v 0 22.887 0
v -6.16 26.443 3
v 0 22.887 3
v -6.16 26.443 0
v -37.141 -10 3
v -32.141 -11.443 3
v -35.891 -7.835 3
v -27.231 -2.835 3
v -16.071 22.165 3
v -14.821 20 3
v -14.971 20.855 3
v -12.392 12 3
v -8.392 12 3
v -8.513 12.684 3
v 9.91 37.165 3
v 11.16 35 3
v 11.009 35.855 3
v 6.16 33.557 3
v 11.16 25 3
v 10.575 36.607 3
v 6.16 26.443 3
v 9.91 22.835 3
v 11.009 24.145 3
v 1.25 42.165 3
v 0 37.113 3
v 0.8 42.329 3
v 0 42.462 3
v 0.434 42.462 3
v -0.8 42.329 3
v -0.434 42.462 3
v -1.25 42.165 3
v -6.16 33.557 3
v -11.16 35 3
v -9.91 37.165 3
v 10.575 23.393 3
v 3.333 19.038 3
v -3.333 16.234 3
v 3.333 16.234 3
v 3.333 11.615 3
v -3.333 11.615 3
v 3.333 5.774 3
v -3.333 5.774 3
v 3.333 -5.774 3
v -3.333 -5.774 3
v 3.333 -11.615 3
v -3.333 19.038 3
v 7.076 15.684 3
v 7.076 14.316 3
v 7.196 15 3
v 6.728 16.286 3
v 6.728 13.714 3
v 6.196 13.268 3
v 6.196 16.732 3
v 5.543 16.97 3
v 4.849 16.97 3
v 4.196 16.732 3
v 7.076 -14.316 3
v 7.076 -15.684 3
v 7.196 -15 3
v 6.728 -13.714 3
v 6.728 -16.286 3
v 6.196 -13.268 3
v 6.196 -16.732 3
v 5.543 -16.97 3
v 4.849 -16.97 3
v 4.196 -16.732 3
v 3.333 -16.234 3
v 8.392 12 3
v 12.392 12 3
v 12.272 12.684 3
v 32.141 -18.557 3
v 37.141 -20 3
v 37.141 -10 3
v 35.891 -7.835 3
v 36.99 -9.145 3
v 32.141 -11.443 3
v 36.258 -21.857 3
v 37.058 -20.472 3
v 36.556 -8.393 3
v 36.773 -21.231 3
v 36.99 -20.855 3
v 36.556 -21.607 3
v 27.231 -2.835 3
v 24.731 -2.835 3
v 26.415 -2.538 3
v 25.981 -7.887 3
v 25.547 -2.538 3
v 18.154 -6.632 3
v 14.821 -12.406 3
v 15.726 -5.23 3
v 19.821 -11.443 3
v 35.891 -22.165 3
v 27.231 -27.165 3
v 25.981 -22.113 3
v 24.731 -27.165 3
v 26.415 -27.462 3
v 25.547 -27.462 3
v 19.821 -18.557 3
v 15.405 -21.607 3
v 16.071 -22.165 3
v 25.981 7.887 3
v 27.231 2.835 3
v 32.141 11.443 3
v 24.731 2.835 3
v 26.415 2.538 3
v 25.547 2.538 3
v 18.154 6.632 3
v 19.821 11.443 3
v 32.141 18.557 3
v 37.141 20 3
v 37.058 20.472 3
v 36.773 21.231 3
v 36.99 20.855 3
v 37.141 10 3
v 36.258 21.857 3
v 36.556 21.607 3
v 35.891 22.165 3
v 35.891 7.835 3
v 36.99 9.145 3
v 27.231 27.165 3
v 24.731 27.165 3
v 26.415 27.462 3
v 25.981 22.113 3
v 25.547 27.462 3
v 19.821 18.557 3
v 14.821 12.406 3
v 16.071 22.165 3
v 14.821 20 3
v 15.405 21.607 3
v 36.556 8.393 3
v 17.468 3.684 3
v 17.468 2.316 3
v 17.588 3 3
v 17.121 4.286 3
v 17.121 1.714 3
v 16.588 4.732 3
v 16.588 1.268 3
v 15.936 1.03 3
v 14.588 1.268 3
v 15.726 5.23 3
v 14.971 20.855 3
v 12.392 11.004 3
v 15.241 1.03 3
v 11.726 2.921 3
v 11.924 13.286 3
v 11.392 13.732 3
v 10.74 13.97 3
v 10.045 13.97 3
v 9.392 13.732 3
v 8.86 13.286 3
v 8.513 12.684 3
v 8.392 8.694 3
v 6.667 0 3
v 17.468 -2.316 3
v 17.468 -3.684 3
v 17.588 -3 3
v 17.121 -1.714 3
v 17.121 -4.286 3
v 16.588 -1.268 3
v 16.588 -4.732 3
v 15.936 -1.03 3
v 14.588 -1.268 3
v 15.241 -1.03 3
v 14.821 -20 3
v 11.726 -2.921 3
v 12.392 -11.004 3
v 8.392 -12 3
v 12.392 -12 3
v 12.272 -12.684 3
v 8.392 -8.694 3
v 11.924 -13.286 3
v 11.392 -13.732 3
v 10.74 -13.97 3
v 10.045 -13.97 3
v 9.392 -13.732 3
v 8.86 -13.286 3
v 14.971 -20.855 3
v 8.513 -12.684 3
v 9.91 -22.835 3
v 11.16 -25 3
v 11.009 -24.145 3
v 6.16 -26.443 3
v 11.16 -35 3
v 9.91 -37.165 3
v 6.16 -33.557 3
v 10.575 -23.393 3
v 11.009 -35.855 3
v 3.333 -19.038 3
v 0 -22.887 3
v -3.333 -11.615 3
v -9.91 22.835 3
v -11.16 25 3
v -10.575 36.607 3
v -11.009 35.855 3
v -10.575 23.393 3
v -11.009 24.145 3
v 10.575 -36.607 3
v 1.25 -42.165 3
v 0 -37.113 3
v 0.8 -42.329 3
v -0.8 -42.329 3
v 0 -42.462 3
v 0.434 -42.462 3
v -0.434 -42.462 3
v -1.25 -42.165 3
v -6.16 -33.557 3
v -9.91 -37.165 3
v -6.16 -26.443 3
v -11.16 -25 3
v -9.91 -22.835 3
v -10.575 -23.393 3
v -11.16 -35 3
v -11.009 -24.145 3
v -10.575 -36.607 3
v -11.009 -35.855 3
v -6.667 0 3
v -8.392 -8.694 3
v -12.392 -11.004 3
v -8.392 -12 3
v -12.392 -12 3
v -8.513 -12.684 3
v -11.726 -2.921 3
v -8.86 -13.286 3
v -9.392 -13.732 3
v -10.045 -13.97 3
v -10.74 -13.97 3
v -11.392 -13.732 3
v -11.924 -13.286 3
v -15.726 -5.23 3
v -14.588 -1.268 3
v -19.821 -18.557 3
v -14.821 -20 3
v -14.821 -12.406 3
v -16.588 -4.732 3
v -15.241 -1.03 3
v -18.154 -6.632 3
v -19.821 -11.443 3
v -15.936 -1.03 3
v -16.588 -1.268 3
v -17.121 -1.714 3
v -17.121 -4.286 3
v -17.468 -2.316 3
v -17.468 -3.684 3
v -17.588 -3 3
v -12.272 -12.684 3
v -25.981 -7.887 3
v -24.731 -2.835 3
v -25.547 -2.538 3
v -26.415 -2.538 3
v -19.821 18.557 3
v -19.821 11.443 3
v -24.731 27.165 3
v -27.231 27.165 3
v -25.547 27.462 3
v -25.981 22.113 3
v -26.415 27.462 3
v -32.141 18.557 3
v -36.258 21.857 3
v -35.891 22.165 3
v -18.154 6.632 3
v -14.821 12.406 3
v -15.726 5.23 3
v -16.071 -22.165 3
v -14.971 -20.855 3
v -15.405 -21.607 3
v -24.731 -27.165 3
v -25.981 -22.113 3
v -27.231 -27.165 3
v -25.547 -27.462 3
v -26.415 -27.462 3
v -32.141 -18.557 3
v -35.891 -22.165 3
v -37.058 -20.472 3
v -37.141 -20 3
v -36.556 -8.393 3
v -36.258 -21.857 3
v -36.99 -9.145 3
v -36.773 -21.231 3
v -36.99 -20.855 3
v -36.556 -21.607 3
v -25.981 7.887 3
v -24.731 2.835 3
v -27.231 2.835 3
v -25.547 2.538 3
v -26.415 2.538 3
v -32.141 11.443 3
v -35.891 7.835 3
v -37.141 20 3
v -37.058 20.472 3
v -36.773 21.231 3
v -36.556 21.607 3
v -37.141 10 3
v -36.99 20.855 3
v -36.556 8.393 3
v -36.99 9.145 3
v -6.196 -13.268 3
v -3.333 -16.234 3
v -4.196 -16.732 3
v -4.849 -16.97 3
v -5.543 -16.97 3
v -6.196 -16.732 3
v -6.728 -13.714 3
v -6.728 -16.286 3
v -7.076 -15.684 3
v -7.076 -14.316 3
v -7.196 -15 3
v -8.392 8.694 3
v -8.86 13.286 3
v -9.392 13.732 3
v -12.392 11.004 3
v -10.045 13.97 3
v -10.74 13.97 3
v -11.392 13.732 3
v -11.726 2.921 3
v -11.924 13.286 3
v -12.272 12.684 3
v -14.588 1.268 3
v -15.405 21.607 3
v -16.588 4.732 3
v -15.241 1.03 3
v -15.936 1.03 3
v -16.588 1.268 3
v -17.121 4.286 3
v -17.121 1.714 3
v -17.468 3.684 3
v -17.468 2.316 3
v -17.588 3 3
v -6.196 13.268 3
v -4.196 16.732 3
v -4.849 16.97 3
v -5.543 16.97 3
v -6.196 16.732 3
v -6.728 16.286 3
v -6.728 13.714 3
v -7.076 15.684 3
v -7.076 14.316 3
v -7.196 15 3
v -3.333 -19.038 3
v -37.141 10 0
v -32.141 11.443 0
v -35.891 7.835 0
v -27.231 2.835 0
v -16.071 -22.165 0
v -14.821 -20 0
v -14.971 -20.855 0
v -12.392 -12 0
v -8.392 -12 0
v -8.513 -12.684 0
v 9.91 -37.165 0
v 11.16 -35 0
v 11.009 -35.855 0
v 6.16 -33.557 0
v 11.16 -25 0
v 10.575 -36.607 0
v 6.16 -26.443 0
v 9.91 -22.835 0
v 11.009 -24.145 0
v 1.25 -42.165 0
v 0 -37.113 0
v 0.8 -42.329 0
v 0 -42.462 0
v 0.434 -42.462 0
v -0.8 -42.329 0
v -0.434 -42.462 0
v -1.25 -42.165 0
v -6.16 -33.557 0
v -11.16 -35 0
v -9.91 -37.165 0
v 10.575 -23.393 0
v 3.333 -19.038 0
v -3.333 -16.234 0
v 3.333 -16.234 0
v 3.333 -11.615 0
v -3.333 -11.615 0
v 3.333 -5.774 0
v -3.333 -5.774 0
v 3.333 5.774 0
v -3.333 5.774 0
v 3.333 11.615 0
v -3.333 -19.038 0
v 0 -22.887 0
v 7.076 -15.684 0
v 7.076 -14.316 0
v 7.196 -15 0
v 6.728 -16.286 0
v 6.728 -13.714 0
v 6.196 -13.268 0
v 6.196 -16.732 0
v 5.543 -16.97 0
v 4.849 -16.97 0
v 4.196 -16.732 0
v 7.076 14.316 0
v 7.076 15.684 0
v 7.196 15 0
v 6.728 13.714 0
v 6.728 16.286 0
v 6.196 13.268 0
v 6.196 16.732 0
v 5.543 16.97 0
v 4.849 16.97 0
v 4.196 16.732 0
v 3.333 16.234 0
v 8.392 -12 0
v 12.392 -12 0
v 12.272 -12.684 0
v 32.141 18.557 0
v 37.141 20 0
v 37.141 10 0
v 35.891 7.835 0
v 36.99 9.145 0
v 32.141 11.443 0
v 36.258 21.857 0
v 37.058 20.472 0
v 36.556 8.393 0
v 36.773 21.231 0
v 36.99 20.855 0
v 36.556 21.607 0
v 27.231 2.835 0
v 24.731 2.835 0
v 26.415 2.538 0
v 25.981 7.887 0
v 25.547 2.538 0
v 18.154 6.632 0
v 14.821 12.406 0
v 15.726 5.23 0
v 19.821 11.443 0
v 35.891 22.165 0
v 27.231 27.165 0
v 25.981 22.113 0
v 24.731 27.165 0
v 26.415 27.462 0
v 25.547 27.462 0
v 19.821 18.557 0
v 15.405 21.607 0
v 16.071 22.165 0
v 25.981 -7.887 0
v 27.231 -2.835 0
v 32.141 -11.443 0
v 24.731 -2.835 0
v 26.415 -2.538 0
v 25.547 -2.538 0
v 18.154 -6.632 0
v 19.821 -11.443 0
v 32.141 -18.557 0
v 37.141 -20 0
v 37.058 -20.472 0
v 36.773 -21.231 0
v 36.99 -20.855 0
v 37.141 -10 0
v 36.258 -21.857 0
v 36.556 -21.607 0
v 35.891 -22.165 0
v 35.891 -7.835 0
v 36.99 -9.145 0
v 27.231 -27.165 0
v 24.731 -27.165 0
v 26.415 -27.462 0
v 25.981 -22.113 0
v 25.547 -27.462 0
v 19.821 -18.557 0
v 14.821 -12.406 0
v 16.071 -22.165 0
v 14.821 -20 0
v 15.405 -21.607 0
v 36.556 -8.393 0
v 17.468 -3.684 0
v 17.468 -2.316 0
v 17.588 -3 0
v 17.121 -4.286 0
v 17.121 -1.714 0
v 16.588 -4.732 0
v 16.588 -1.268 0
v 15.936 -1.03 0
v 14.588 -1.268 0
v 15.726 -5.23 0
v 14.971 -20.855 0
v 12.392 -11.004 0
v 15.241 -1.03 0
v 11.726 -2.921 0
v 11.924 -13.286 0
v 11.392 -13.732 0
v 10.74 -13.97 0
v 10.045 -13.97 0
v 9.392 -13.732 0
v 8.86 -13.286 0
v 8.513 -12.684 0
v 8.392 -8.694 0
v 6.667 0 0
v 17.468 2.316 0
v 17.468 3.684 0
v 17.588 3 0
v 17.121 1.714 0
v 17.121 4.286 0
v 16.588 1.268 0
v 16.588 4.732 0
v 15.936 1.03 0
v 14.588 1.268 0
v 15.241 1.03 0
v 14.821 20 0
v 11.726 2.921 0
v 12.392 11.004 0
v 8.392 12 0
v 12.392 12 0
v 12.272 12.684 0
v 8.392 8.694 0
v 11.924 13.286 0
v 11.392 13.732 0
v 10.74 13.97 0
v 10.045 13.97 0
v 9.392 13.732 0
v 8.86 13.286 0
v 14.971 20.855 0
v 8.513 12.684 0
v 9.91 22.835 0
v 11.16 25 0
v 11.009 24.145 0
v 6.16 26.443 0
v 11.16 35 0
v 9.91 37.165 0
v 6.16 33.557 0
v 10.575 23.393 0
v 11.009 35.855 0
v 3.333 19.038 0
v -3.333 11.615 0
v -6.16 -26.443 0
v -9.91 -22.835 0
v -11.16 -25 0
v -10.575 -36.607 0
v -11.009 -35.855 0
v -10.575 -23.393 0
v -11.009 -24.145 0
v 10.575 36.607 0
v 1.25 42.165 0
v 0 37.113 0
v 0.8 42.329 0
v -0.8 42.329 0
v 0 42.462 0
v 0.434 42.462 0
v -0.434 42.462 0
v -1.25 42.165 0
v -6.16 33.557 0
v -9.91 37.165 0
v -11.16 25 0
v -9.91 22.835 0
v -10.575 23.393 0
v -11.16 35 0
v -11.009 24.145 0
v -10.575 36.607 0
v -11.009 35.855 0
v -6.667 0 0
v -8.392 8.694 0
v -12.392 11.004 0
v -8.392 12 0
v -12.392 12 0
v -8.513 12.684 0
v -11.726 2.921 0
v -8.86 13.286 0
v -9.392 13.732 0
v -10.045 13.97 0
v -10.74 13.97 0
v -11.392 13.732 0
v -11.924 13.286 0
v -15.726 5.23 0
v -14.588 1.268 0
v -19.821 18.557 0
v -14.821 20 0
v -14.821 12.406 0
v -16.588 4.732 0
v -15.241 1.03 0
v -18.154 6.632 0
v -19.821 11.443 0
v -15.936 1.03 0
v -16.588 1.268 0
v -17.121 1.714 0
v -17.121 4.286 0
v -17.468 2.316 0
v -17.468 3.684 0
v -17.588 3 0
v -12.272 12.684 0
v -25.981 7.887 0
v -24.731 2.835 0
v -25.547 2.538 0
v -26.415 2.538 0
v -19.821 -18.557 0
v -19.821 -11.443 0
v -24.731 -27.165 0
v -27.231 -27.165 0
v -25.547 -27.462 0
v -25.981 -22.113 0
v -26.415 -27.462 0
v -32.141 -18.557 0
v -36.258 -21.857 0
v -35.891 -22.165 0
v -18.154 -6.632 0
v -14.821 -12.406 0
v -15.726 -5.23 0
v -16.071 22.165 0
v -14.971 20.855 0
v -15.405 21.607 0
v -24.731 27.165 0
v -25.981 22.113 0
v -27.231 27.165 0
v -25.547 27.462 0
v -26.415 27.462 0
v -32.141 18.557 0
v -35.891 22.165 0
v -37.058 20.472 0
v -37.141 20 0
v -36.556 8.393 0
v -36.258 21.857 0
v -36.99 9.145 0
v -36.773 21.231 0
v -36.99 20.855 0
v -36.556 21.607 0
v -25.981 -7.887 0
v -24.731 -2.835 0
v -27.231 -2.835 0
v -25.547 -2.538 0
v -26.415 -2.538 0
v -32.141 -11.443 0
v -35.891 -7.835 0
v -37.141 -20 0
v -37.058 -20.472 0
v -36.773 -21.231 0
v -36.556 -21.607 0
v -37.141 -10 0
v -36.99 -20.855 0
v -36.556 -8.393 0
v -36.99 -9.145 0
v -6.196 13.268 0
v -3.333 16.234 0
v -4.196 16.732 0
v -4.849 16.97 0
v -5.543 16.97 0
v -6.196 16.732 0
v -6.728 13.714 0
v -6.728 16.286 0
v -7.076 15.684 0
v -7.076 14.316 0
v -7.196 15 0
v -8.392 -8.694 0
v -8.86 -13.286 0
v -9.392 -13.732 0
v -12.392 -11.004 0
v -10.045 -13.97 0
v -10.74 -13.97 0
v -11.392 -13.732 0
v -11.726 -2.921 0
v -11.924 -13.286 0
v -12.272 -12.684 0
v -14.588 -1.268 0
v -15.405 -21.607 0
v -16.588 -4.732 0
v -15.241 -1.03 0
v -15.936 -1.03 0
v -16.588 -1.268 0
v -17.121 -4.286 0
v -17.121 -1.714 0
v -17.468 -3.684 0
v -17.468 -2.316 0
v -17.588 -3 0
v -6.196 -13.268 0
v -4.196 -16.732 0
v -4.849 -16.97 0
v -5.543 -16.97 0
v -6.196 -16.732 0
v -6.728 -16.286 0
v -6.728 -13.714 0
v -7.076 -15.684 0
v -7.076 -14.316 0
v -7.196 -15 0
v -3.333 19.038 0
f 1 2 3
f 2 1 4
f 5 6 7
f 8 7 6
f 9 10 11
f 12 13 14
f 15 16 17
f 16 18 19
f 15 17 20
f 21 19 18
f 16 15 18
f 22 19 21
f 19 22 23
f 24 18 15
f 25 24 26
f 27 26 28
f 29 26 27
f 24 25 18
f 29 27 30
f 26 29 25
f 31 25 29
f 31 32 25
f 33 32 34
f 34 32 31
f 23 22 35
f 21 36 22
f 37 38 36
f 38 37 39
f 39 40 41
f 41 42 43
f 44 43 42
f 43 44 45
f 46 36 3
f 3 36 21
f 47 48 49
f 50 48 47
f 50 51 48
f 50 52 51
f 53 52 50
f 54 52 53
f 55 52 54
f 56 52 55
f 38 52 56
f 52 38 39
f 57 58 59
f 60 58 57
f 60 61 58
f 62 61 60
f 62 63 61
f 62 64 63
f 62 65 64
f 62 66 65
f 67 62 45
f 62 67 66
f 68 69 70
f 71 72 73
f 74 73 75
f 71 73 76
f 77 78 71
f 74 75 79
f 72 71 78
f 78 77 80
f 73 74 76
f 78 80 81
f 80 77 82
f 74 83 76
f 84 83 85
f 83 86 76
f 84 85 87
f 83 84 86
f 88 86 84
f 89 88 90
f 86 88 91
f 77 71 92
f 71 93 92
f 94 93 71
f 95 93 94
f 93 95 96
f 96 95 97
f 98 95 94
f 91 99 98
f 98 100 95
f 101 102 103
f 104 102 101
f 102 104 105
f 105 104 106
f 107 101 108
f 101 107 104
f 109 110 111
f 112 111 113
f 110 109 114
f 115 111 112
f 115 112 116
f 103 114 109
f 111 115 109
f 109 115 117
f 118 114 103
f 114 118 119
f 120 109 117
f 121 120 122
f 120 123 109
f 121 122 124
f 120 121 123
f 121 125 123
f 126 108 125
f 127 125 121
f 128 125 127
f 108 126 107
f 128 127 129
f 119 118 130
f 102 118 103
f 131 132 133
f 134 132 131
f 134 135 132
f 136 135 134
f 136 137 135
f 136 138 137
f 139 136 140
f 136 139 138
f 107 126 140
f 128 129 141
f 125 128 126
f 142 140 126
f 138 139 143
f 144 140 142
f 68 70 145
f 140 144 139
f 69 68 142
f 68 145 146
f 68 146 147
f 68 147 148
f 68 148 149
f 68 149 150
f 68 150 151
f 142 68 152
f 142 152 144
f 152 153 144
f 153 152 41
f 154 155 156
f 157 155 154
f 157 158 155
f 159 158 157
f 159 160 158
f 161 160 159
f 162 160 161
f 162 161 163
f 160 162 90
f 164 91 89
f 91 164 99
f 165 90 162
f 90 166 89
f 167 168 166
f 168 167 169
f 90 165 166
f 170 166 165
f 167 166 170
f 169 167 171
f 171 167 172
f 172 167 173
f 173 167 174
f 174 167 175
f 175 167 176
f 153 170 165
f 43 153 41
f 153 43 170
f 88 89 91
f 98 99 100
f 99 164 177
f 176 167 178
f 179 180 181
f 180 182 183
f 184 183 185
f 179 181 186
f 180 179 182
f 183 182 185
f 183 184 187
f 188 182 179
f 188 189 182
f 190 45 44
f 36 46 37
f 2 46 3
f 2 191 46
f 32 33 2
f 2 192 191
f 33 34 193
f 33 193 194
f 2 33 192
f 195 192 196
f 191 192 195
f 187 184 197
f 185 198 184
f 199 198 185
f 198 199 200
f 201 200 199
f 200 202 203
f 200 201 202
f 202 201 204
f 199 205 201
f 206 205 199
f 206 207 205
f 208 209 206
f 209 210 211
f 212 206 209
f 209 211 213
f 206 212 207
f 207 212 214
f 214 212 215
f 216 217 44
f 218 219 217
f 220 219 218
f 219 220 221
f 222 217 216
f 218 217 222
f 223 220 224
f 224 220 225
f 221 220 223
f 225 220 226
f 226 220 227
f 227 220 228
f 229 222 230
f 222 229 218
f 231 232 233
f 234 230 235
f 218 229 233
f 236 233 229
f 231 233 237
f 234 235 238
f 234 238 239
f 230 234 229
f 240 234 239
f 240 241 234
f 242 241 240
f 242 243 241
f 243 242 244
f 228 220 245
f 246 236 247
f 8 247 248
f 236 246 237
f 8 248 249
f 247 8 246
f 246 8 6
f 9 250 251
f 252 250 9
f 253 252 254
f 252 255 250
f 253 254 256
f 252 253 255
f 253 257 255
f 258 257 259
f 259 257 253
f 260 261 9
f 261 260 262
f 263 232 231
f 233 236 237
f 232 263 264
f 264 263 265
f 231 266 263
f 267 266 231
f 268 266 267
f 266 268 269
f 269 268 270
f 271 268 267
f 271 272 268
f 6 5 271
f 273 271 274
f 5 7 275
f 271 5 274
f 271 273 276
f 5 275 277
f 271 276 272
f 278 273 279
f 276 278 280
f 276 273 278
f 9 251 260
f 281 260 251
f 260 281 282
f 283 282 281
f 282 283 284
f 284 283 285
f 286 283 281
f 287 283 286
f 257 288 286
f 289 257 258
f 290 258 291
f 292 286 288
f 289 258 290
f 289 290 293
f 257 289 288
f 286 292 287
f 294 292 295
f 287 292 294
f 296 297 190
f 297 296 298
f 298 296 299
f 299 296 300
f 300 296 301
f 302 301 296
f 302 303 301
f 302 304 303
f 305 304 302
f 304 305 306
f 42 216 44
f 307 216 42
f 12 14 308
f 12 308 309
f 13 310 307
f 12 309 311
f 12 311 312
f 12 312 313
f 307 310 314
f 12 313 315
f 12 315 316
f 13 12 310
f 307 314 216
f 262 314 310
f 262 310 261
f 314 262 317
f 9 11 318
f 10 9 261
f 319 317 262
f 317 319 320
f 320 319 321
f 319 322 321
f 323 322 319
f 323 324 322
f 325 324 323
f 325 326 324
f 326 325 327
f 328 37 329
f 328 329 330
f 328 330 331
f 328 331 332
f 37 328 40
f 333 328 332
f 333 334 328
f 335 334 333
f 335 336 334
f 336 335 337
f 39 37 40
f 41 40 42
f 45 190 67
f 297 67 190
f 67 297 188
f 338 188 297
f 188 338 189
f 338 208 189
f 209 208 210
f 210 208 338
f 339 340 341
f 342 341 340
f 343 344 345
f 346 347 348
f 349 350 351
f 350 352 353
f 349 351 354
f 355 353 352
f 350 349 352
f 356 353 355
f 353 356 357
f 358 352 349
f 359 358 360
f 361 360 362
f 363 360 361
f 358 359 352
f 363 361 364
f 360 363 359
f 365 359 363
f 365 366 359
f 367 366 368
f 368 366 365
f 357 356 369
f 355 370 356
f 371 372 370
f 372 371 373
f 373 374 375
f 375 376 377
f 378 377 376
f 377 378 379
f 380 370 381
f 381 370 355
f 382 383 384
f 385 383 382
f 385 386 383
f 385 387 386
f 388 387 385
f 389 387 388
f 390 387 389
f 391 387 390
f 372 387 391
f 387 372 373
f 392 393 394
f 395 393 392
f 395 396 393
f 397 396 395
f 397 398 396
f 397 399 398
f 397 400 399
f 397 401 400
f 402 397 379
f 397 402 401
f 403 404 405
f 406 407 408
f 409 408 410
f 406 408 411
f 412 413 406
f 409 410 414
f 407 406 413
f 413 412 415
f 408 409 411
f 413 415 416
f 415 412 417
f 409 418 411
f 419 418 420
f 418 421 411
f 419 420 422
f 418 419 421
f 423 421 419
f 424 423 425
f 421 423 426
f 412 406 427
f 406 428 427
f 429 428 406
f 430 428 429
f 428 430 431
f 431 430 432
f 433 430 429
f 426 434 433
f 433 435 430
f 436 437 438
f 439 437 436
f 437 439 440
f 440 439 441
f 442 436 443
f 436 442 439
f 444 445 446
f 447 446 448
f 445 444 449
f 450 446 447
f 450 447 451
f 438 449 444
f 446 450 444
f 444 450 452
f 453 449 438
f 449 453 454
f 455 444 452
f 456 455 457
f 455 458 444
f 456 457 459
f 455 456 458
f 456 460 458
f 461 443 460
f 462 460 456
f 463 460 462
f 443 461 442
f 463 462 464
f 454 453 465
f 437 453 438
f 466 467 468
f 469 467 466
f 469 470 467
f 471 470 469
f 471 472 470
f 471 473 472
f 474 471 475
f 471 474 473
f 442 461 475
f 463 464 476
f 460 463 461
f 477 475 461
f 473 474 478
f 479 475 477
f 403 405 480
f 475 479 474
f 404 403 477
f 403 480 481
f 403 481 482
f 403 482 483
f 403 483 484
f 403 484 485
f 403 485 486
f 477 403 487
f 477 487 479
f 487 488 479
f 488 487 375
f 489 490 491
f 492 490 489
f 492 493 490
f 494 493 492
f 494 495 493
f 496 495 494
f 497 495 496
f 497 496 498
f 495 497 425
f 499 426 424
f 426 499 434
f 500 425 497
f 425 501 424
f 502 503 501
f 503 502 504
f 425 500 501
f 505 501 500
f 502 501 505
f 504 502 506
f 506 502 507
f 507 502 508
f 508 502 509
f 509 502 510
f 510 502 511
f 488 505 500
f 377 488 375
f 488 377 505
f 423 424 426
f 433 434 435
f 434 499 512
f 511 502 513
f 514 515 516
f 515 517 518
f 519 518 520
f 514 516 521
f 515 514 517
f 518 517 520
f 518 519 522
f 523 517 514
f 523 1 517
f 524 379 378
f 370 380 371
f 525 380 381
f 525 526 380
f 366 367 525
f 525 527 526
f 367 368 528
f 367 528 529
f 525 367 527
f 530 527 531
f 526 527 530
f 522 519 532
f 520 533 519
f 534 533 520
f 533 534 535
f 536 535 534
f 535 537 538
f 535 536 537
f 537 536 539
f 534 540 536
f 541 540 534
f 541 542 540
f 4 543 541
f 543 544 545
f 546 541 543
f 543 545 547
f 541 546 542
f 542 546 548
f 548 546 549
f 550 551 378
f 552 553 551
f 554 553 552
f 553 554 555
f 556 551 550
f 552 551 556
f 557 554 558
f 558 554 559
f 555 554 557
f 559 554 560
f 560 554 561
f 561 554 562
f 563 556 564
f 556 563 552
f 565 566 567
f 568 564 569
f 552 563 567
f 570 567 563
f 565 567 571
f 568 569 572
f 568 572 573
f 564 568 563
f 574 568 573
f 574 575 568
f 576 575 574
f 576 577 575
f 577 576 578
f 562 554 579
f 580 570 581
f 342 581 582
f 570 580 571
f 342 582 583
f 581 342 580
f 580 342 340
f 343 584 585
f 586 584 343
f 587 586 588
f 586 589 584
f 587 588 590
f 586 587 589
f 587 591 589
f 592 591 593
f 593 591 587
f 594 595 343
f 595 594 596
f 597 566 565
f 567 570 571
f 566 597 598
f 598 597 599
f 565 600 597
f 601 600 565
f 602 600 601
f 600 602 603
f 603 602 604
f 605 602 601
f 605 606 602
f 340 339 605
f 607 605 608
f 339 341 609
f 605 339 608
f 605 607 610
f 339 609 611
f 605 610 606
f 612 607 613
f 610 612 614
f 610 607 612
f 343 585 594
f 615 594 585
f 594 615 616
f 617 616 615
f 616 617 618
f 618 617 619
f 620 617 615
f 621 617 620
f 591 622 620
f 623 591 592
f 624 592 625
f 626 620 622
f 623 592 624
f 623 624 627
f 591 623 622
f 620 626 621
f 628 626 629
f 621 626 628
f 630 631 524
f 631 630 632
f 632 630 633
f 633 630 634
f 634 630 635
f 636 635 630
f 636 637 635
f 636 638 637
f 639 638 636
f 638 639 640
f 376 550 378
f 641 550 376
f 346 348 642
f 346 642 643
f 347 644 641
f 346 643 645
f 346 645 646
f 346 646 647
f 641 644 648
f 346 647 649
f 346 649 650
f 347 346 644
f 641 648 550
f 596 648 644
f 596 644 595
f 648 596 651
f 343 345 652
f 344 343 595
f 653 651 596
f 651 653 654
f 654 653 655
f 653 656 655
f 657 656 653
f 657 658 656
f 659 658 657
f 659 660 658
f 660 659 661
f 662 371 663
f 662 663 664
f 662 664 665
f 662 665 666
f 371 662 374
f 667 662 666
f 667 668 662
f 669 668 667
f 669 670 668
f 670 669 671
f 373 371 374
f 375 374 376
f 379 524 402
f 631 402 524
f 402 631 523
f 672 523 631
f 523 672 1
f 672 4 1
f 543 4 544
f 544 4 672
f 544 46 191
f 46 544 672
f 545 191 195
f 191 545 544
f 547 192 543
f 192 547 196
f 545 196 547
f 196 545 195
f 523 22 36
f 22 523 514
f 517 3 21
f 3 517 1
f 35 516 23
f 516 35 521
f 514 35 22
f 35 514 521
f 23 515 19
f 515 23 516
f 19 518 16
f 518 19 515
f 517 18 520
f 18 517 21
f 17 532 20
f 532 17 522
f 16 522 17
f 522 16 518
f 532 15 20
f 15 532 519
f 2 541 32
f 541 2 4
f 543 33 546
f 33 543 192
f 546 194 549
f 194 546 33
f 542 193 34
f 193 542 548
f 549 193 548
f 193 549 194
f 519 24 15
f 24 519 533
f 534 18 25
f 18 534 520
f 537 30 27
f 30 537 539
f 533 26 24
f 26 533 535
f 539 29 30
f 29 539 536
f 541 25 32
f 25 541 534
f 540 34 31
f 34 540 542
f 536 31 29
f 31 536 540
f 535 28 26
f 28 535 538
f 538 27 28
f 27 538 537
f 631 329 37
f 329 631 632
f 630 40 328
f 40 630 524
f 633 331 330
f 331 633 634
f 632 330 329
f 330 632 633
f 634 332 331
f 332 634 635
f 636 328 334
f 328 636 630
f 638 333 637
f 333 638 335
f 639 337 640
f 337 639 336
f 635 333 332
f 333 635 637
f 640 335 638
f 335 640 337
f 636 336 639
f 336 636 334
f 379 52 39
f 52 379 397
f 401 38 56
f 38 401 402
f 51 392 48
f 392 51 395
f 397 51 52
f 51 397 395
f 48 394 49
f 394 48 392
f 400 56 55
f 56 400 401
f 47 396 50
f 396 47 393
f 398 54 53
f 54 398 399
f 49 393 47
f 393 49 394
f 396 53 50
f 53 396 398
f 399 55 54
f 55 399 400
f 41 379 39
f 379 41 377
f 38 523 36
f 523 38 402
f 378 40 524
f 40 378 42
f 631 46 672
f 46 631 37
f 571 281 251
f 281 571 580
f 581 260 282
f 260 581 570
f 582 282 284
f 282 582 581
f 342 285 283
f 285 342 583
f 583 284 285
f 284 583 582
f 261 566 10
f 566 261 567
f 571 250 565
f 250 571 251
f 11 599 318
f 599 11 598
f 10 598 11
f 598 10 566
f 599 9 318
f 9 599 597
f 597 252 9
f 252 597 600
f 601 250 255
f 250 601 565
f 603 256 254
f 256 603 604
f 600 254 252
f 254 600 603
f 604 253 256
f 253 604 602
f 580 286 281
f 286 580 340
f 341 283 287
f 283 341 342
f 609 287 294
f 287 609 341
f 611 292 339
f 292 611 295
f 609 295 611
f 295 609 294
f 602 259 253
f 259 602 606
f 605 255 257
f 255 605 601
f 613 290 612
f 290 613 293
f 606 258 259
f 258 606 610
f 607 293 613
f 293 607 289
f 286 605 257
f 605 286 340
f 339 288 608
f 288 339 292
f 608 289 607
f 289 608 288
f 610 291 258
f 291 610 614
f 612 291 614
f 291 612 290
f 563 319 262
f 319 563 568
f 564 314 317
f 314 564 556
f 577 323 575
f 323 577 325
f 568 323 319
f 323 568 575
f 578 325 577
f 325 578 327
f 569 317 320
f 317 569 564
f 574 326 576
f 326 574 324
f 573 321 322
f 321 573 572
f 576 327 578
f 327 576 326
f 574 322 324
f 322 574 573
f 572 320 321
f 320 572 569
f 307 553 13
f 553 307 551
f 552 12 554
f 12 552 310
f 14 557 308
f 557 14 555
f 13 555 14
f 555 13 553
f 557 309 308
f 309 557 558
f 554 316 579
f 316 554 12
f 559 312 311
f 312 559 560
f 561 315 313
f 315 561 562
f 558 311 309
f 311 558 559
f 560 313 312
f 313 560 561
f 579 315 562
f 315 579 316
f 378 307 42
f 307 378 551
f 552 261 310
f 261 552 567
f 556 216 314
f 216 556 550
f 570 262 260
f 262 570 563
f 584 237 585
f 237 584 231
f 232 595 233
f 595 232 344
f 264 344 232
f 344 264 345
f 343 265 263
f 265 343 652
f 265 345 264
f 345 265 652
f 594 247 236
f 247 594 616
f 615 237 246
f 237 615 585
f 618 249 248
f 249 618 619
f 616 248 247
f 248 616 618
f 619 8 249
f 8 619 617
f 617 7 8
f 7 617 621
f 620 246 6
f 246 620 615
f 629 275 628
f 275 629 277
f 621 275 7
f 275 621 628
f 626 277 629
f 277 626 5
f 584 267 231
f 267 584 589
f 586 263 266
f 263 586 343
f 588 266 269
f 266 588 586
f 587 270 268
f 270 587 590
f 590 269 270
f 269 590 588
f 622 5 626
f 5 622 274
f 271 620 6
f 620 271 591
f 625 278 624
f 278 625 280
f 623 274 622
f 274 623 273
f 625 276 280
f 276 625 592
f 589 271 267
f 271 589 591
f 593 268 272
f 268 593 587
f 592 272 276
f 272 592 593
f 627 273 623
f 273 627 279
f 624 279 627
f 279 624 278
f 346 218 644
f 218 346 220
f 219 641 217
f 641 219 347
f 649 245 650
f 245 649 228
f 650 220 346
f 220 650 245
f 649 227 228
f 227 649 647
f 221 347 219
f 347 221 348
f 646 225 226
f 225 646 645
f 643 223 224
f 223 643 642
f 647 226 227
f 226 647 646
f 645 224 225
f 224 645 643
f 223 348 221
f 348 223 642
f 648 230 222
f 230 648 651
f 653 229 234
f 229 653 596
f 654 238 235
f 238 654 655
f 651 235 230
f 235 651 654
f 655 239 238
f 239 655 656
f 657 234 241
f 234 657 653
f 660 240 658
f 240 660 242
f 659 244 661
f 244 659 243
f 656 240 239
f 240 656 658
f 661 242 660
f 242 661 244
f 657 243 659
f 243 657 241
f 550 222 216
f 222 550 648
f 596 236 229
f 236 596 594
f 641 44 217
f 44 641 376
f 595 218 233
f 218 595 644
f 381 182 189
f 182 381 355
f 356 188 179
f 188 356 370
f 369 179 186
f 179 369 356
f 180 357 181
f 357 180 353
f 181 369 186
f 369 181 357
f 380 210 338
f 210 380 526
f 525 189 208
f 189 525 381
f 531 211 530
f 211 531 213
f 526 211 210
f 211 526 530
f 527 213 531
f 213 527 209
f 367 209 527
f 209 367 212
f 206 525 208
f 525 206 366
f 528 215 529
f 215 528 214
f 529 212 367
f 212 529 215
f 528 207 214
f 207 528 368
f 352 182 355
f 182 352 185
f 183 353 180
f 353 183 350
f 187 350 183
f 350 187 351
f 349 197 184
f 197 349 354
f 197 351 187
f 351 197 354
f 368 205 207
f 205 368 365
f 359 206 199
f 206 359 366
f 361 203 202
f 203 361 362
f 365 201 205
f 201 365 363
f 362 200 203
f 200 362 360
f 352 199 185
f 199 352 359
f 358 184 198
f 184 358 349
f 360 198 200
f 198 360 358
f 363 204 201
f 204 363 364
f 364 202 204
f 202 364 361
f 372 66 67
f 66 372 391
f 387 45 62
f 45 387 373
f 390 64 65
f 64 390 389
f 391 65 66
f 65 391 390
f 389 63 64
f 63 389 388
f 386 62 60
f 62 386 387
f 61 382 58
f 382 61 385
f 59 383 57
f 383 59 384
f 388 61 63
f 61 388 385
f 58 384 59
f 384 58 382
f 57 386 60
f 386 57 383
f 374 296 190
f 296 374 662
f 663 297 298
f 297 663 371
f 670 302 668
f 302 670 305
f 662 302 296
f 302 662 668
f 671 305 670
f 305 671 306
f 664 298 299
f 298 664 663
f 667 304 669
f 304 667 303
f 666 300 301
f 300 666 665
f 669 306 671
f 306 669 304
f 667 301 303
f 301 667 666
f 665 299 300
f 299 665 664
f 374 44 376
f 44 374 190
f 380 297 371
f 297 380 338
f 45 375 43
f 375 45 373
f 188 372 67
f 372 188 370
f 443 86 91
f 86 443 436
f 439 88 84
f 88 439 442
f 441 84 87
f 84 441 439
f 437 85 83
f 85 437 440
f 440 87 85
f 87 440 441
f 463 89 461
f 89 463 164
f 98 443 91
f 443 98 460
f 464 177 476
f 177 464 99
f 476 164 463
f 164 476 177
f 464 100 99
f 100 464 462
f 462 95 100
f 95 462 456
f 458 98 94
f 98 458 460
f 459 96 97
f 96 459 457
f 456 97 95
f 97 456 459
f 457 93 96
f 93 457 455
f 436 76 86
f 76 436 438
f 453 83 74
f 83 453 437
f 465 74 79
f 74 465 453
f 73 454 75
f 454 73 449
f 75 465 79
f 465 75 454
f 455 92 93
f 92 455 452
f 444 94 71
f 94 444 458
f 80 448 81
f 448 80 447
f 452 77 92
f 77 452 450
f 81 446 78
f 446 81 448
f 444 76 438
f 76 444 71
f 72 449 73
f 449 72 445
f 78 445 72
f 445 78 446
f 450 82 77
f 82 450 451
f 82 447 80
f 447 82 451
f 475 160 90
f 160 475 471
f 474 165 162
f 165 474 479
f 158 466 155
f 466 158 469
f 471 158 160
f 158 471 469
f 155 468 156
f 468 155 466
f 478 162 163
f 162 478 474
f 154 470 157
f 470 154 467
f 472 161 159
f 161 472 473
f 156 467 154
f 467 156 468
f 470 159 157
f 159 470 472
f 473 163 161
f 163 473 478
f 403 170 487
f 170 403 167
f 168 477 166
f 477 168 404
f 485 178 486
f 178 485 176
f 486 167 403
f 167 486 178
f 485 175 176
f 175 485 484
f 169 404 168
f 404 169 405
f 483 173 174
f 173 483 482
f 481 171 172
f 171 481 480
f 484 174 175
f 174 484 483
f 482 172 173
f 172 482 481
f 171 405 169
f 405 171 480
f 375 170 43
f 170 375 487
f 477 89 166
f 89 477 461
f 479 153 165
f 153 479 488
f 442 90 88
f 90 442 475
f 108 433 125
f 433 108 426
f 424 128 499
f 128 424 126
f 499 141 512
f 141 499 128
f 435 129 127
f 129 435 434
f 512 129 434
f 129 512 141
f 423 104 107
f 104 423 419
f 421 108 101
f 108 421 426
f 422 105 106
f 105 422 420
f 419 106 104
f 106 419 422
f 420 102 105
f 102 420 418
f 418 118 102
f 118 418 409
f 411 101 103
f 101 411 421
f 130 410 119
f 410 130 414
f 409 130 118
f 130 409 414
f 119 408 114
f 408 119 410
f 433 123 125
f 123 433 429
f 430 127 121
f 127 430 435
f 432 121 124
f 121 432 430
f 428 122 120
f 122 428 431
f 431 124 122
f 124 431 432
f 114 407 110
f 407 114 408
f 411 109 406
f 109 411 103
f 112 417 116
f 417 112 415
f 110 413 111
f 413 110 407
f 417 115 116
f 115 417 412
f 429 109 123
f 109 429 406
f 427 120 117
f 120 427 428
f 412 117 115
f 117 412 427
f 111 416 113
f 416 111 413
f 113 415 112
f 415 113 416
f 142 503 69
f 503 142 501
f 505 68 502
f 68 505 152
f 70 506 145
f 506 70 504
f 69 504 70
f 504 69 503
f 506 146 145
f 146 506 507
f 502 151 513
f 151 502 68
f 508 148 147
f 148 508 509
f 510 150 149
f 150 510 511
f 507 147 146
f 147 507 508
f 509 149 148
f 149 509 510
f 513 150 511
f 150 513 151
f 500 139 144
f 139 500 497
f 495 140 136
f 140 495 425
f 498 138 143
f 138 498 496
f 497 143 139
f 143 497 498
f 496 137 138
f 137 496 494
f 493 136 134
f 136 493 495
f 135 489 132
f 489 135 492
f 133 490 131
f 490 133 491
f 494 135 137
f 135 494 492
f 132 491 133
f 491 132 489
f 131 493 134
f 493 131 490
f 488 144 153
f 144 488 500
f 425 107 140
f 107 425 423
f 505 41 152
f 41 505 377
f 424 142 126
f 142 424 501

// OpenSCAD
// snowflake 2
// @author Ilya Protasov

height = 3;
radius = 40;
thickA = radius/6;
thickB = radius/8;
thickC = radius/10;

//count of segments in arcs https://en.wikibooks.org/wiki/OpenSCAD_User_Manual/Other_Language_Features#$fa,_$fs_and_$fn
$fn = 18; 
//Indigo DeepSkyBlue YellowGreen DeepPink OrangeRed LawnGreen DarkSlateBlue Magenta

module box(xCount, yCount, zCount) {
    translate([halfGap, halfGap, halfGap]) cube([boundDist(xCount), boundDist(yCount), boundDist(zCount)], false);
}

module branch1() {
    lenSub = radius*0.25;
    lenSubM = lenSub;
    deltaX = lenSub*sin(60);
    deltaY = lenSub*cos(60);
    lenBig = radius - 2*deltaY - lenSubM;
    
    //big
    translate([-thickA/2, 0, 0]) cube([thickA, lenBig, height], false);
    //translate([0, radius, 0])  cylinder(height, thickA/2, thickA/2, false);
    //hexagon
    translate([0, lenBig, 0]) rotate([0, 0, 60]) branch2(thickB, lenSub);
    translate([0, lenBig, 0]) rotate([0, 0, -60]) branch2(thickB, lenSub);
    translate([deltaX, lenBig + deltaY, 0]) rotate([0, 0, 0]) branch2(thickB, lenSubM);
    translate([-deltaX, lenBig + deltaY, 0]) rotate([0, 0, 0]) branch2(thickB, lenSubM);
    translate([deltaX, radius - deltaY, 0]) rotate([0, 0, 60]) branch2(thickB, lenSubM);
    translate([-deltaX, radius - deltaY, 0]) rotate([0, 0, -60]) branch2(thickB, lenSubM);
    //separate subbranch
    translate([0, lenBig*0.6, 0]) rotate([0, 0, 60]) branch2(thickC, lenSub*.6);
    translate([0, lenBig*0.6, 0]) rotate([0, 0, -60]) branch2(thickC, lenSub*.6);
}

module branch2(thick, length) {
    translate([-thick/2, 0, 0]) cube([thick, length, height], false);
    translate([0, length, 0]) cylinder(height, thick/2, thick/2, false);
}

module ring() {
    translate([0, radius + thickA, 0])
        difference() {
            cylinder(height, thickA, thickA, false);
            cylinder(height * 2, thickA/2, thickA/2, true);
        }
}

module snowflake1(branchCount) {
    angle = 360 / branchCount;
    for (i=[0:branchCount-1]) {
        rotate([0, 0, i * angle]) branch1();
    }
    //ring();
}

color("DeepSkyBlue") snowflake1(6);
